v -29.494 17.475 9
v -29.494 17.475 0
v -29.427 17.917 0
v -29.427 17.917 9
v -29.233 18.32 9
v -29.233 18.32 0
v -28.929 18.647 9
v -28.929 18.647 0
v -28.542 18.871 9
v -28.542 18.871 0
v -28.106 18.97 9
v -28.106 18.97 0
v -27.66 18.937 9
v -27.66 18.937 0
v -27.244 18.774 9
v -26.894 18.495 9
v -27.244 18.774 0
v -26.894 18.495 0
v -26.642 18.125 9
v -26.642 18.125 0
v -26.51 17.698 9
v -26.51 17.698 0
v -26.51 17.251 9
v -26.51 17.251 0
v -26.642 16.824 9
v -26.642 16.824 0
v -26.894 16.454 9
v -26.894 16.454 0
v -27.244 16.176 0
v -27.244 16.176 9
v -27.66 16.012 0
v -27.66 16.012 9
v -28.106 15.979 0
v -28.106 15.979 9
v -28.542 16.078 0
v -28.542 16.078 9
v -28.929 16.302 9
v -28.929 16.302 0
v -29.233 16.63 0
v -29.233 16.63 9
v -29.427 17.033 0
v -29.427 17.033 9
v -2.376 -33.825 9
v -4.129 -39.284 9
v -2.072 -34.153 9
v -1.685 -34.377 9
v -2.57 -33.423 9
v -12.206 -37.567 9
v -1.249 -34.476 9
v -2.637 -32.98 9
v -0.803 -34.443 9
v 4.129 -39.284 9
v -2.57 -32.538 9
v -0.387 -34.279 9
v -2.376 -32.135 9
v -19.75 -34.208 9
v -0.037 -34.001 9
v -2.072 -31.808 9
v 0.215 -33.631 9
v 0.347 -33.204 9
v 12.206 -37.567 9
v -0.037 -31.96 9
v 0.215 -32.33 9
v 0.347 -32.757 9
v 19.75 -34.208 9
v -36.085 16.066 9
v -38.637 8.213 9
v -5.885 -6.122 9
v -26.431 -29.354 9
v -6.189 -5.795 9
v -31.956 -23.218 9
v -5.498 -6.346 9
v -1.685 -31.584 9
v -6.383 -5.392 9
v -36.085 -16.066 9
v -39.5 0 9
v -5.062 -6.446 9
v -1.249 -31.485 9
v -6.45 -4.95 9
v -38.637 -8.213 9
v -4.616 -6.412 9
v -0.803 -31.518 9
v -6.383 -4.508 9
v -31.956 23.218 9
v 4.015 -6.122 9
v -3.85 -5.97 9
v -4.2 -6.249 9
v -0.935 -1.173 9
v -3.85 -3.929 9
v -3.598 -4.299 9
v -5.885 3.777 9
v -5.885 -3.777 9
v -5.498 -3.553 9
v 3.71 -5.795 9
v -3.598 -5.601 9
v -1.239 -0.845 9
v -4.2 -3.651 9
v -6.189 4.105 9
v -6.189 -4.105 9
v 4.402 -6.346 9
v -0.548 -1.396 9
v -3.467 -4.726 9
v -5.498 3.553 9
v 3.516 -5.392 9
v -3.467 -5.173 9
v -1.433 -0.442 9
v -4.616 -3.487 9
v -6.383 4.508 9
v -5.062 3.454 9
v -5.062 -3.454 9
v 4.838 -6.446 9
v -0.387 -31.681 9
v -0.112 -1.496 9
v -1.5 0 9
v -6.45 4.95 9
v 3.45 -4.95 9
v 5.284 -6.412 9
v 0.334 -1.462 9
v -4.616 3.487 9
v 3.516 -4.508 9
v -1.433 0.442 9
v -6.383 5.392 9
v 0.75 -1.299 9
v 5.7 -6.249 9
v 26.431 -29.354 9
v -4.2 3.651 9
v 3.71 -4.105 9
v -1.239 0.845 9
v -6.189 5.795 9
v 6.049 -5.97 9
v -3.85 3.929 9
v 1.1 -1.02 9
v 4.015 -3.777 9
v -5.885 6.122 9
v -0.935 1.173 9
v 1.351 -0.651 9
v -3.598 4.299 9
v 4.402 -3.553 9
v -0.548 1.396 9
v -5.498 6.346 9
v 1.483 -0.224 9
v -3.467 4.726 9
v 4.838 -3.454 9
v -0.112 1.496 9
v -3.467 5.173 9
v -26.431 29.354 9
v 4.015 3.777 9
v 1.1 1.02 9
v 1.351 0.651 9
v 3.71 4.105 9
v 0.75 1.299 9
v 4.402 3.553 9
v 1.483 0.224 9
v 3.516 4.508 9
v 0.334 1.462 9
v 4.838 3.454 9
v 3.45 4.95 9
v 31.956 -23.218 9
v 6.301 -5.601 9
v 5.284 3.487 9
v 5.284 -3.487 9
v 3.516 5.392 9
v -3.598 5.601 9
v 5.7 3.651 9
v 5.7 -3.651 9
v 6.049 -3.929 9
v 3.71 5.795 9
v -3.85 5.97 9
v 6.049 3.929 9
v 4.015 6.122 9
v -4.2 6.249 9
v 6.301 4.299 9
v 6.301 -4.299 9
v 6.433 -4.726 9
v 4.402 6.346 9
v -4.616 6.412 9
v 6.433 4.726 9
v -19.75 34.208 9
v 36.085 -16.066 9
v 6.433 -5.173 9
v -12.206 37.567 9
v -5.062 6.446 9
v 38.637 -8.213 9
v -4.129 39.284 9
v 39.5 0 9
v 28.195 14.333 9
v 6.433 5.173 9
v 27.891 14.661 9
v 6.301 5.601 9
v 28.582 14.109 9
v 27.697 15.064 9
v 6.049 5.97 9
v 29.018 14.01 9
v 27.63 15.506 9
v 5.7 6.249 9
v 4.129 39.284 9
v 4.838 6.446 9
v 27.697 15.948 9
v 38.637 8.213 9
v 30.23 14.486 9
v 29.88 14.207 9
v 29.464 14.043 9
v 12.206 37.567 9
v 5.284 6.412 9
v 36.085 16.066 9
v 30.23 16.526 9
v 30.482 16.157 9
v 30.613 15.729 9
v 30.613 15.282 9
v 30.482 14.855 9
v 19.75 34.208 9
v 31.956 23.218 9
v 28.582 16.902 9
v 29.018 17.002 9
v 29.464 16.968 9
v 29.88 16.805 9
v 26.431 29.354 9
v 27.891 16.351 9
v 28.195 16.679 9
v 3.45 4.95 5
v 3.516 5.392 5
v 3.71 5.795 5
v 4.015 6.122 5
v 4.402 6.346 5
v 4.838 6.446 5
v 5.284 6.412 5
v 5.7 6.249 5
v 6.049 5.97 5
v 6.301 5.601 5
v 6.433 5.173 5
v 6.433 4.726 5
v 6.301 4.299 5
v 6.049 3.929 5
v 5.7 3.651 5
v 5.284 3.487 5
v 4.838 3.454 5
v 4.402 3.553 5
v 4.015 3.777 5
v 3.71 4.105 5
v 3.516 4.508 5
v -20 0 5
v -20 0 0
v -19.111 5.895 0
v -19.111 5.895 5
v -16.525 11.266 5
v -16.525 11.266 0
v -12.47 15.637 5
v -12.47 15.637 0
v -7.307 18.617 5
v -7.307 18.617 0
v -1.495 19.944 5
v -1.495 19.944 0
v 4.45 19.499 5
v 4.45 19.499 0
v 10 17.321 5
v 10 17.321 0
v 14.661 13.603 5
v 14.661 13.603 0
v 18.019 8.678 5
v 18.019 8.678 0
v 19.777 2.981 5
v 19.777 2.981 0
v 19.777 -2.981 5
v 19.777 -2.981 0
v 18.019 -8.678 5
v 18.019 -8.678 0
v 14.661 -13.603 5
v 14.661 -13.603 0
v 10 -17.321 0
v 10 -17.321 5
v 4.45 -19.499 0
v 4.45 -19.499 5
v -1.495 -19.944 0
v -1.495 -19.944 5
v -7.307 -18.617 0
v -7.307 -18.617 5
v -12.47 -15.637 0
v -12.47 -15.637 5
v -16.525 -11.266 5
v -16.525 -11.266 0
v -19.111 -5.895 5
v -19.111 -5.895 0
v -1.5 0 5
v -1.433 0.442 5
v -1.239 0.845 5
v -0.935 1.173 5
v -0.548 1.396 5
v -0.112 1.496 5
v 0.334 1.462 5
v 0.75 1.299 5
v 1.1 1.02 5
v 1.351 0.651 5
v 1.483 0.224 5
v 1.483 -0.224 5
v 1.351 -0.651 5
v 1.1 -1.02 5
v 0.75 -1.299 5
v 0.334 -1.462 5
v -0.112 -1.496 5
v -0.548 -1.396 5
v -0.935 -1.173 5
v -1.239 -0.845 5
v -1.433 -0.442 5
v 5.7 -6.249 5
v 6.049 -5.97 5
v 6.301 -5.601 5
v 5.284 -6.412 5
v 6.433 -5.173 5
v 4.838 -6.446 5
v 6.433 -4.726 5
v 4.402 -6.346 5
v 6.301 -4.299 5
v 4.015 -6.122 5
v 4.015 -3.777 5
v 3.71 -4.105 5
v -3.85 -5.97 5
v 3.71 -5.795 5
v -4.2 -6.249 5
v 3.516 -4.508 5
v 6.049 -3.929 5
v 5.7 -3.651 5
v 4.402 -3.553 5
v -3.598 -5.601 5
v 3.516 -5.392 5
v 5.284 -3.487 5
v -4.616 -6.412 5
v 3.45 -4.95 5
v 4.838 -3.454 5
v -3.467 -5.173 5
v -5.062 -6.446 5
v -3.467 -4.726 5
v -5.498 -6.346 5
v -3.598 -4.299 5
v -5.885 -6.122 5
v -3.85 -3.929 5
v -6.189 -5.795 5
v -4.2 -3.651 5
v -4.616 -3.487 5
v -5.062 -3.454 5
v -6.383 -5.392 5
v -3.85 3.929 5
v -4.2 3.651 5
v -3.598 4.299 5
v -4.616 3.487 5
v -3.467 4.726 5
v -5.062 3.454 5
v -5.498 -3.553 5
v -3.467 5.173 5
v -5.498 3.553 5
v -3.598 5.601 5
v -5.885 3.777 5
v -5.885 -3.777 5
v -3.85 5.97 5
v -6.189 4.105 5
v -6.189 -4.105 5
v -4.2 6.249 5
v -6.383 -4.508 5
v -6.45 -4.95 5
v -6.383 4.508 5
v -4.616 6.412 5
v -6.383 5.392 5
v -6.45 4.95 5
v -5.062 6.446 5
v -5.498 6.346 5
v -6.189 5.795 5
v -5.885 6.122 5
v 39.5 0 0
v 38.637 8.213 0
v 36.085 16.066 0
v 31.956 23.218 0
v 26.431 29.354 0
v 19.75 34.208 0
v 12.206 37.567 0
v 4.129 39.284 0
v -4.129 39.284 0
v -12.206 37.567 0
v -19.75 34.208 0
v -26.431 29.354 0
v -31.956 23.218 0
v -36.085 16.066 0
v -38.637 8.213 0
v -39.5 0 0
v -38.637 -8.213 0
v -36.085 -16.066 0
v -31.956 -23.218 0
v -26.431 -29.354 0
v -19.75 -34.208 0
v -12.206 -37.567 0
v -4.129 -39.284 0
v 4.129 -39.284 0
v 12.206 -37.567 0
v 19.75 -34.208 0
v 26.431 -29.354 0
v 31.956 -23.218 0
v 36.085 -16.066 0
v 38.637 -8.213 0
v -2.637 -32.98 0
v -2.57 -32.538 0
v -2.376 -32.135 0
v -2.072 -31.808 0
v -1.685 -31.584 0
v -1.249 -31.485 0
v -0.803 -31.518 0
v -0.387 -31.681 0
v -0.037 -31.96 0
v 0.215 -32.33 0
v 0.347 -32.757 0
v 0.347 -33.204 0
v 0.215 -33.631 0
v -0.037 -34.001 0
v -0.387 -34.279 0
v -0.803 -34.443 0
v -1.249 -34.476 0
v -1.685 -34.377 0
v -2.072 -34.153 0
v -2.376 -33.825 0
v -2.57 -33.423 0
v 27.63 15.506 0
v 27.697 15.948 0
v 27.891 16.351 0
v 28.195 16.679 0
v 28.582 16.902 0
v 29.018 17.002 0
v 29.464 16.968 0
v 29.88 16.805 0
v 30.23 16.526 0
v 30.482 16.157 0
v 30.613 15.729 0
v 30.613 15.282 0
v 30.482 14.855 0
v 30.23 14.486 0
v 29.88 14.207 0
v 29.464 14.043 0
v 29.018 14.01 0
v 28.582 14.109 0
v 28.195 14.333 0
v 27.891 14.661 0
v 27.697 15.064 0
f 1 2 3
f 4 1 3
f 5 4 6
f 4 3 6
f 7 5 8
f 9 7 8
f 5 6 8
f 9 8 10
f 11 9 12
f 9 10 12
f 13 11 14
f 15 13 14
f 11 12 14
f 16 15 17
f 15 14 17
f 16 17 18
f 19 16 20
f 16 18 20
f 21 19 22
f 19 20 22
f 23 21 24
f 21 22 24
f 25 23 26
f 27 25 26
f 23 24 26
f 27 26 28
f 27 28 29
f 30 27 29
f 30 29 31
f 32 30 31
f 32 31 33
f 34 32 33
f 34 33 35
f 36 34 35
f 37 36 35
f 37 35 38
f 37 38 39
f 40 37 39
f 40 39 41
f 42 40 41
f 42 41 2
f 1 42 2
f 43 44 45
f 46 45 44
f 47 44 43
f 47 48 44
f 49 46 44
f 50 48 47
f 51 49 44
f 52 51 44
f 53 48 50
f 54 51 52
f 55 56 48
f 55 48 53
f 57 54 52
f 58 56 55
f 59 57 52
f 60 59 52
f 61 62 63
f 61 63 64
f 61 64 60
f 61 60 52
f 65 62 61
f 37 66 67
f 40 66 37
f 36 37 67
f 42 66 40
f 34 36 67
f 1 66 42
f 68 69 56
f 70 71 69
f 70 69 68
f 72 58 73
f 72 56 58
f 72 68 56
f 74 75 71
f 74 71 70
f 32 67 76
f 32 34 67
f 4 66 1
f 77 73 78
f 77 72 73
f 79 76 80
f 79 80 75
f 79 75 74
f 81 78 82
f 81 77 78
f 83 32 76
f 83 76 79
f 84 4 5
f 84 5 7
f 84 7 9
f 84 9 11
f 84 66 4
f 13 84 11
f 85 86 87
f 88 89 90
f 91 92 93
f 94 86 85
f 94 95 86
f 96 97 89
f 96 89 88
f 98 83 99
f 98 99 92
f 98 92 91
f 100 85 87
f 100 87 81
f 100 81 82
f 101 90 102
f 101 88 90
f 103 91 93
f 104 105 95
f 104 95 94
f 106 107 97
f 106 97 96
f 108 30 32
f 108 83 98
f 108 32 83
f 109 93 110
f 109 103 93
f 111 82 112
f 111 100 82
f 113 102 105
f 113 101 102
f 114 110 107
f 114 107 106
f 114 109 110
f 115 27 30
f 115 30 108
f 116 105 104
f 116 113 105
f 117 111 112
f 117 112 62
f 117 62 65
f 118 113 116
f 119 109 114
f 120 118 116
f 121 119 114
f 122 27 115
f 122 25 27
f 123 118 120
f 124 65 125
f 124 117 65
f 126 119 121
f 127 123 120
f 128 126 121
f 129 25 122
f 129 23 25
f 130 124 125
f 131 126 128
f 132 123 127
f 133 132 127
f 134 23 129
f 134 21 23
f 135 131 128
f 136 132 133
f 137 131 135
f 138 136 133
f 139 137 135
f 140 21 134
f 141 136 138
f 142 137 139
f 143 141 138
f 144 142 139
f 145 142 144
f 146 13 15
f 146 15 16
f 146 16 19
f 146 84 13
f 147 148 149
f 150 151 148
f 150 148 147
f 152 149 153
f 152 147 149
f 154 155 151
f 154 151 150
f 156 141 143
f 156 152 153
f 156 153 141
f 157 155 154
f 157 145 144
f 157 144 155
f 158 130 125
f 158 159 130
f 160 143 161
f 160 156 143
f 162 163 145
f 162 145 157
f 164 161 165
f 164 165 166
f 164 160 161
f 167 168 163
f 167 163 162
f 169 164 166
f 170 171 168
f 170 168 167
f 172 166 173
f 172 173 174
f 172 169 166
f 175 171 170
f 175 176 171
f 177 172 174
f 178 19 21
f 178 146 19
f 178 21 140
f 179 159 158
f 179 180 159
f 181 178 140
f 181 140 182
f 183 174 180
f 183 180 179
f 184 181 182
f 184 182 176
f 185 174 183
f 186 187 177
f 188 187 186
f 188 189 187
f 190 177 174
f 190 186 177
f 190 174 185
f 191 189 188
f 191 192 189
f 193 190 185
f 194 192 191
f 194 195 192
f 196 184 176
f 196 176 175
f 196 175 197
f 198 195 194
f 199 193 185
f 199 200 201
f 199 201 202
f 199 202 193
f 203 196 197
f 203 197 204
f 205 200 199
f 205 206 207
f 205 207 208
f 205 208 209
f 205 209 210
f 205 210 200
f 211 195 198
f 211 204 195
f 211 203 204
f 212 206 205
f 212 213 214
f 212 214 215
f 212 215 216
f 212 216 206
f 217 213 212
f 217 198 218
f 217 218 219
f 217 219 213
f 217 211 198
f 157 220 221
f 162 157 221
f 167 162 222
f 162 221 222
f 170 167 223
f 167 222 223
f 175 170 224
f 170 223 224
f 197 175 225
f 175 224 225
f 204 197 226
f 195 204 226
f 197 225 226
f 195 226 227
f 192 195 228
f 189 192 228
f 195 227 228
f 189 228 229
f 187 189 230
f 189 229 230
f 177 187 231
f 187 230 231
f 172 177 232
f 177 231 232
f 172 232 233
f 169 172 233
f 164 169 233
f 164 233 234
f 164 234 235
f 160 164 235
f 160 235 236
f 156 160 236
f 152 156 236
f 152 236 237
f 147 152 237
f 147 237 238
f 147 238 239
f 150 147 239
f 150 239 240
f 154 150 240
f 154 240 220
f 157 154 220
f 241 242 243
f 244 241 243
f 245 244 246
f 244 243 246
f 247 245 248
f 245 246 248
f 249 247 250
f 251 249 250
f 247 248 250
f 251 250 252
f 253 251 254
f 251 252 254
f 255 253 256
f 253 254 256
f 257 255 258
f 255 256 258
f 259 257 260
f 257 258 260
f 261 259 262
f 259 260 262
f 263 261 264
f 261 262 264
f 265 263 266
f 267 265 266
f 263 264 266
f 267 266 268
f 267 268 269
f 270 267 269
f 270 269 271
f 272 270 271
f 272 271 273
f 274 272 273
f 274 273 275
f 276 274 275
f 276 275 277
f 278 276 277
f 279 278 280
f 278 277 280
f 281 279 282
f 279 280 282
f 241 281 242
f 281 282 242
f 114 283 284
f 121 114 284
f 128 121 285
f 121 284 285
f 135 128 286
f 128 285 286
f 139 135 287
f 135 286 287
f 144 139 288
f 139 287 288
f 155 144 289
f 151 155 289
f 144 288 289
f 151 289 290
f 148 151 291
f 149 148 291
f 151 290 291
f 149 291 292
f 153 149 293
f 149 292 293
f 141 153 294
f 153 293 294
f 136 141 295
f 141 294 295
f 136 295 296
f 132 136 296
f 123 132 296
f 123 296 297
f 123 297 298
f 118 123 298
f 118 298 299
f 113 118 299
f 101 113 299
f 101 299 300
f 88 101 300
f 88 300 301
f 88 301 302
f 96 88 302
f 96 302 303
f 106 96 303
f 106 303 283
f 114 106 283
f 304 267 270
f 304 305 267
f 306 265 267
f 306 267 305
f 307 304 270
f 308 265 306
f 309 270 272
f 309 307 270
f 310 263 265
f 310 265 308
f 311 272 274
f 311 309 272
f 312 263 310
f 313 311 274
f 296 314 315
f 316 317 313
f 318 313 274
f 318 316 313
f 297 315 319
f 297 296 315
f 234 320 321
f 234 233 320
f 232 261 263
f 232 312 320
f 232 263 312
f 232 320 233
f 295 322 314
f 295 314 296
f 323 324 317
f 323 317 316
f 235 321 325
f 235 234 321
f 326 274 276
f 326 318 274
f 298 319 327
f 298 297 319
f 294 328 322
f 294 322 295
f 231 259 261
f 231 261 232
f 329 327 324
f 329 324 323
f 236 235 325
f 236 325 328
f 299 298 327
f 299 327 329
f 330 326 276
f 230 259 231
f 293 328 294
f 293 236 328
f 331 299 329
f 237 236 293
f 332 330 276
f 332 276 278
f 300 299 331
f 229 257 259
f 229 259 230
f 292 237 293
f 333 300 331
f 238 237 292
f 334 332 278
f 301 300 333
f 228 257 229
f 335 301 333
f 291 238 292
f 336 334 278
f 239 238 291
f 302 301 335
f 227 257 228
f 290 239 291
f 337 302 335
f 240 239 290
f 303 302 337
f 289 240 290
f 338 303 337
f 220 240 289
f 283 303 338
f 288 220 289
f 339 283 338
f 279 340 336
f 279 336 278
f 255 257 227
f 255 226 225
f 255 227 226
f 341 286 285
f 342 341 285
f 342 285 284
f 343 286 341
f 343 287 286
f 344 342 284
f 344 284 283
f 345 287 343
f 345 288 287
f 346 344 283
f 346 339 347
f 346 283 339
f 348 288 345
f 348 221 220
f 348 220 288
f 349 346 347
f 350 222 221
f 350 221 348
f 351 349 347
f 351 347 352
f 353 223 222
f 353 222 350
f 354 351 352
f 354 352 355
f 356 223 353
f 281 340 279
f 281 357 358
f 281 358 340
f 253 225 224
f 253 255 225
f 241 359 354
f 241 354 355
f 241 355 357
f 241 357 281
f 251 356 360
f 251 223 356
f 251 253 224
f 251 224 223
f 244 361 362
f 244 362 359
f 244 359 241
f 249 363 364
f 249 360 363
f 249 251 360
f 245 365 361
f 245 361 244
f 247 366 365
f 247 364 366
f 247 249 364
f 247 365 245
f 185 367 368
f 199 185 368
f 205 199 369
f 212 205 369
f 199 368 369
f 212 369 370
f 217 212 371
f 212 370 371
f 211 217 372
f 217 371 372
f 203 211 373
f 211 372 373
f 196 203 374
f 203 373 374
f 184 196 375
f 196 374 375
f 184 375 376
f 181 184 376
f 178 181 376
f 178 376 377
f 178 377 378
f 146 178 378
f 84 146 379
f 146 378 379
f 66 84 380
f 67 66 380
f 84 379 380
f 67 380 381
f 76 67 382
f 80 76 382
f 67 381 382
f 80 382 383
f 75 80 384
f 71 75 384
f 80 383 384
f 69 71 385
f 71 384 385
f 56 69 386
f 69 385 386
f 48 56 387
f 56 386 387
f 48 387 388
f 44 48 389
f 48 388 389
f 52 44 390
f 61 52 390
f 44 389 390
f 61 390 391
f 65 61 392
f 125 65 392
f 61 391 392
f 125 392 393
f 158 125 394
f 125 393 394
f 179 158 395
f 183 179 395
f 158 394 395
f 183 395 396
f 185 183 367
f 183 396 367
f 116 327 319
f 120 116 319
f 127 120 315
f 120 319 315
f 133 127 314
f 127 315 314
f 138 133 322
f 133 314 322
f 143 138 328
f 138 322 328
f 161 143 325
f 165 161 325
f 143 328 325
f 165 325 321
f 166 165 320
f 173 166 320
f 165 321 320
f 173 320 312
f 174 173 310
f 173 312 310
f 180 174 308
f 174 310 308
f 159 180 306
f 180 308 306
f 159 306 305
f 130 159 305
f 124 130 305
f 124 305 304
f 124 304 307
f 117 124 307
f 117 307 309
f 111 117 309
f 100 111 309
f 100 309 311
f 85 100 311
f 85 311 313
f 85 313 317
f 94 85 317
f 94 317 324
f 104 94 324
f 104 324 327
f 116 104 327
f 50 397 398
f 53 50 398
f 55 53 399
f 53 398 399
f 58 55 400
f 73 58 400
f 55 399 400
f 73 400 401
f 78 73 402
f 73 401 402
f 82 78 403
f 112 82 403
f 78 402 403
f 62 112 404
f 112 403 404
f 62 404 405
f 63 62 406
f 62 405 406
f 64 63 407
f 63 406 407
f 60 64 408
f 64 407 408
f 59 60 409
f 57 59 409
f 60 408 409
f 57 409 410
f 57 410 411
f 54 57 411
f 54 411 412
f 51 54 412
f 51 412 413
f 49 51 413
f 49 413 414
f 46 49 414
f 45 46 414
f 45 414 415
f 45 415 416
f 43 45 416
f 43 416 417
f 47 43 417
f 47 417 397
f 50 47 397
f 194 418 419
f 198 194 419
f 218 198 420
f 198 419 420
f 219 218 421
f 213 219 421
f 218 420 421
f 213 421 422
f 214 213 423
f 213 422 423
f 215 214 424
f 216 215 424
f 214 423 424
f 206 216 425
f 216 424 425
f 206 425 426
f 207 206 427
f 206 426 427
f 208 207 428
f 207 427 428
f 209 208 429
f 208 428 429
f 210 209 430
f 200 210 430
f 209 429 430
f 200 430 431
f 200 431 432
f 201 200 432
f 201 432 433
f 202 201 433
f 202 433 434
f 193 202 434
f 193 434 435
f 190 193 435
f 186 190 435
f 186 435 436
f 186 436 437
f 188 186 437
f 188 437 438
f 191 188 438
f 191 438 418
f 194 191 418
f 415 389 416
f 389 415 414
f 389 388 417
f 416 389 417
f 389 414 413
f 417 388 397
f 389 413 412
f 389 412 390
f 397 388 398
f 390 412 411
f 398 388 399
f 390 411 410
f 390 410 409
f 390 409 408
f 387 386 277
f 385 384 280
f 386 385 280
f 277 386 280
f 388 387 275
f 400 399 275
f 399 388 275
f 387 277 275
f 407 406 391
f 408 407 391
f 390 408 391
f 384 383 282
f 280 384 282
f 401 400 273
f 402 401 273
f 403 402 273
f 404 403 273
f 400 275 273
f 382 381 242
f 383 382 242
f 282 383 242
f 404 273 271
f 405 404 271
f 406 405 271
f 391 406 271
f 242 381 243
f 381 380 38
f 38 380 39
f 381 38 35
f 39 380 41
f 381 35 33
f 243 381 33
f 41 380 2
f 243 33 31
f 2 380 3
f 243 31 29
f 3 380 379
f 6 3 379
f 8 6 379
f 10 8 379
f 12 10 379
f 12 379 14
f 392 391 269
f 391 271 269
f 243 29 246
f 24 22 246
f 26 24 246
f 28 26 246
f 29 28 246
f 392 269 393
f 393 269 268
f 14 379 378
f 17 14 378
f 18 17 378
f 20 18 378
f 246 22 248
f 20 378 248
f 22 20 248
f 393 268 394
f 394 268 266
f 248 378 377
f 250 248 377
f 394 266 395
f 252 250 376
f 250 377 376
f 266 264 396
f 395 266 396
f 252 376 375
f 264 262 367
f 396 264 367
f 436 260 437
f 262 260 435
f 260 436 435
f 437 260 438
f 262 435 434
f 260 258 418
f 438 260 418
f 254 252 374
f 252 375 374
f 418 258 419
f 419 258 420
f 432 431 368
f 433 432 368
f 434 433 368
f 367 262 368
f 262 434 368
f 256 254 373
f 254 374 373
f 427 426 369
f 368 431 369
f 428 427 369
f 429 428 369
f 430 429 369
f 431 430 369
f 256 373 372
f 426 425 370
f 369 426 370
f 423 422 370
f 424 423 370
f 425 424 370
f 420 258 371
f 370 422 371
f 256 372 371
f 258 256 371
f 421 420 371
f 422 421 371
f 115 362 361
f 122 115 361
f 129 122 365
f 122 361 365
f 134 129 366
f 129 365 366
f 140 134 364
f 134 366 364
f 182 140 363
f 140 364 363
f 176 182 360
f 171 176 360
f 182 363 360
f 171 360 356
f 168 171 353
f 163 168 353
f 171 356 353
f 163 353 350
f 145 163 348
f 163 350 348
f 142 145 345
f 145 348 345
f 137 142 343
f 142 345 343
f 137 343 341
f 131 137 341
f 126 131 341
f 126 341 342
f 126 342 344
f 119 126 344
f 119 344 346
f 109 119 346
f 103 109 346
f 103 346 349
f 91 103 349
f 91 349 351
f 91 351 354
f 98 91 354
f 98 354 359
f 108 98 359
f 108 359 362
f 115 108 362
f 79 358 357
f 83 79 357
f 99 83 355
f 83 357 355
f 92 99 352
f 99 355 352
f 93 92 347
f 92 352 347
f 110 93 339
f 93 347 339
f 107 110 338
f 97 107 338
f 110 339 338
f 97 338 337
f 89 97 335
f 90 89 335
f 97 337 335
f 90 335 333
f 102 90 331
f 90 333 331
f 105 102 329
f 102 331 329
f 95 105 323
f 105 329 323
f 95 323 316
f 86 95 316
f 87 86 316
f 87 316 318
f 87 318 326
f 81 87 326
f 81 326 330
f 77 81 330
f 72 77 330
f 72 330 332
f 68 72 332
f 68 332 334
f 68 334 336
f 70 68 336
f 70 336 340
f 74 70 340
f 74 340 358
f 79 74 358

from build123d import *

# Parameters (mm, degrees)
SKETCH_1_R          = 39.5
EXTRUDE_1_DEPTH     = 9
SKETCH_2_R          = 20
CUT_EXTRUDE_1_DEPTH = 5
SKETCH_3_R          = 1.5
CUT_EXTRUDE_2_DEPTH = 57.581799194
SKETCH_4_R          = 1.5
CUT_EXTRUDE_3_DEPTH = 57.084757288


with BuildPart() as part:
    # 草图1 → 凸台-拉伸1 (new body)
    with BuildSketch(Plane.XY):
        Circle(SKETCH_1_R)
    extrude(amount=EXTRUDE_1_DEPTH)

    # 草图2 → 切除-拉伸1 (cut)
    with BuildSketch(Plane(origin=(0, 0, 0), x_dir=(-1, 0, 0), z_dir=(0, 0, -1))):
        Circle(SKETCH_2_R)
    extrude(amount=-CUT_EXTRUDE_1_DEPTH, mode=Mode.SUBTRACT)

    # 草图3 → 切除-拉伸2 (cut, through all)
    with BuildSketch(Plane(origin=(0, 0, 0), x_dir=(-1, 0, 0), z_dir=(0, 0, -1))):
        with Locations((1.136716128, -32.98041656)):
            Circle(SKETCH_3_R)
        with Locations((-29.130236632, 15.505783236)):
            Circle(SKETCH_3_R)
        with Locations((27.993520504, 17.474633324)):
            Circle(SKETCH_3_R)
    extrude(amount=-CUT_EXTRUDE_2_DEPTH, mode=Mode.SUBTRACT)

    # 草图4 → 切除-拉伸3 (cut, through all)
    with BuildSketch(Plane(origin=(0, 0, 5), x_dir=(-1, 0, 0), z_dir=(0, 0, -1))):
        Circle(SKETCH_4_R)
        with Locations((-4.949747468, 4.949747468)):
            Circle(SKETCH_4_R)
        with Locations((4.949747468, 4.949747468)):
            Circle(SKETCH_4_R)
        with Locations((4.949747468, -4.949747468)):
            Circle(SKETCH_4_R)
        with Locations((-4.949747468, -4.949747468)):
            Circle(SKETCH_4_R)
    extrude(amount=-CUT_EXTRUDE_3_DEPTH, mode=Mode.SUBTRACT)


solid = part.part
